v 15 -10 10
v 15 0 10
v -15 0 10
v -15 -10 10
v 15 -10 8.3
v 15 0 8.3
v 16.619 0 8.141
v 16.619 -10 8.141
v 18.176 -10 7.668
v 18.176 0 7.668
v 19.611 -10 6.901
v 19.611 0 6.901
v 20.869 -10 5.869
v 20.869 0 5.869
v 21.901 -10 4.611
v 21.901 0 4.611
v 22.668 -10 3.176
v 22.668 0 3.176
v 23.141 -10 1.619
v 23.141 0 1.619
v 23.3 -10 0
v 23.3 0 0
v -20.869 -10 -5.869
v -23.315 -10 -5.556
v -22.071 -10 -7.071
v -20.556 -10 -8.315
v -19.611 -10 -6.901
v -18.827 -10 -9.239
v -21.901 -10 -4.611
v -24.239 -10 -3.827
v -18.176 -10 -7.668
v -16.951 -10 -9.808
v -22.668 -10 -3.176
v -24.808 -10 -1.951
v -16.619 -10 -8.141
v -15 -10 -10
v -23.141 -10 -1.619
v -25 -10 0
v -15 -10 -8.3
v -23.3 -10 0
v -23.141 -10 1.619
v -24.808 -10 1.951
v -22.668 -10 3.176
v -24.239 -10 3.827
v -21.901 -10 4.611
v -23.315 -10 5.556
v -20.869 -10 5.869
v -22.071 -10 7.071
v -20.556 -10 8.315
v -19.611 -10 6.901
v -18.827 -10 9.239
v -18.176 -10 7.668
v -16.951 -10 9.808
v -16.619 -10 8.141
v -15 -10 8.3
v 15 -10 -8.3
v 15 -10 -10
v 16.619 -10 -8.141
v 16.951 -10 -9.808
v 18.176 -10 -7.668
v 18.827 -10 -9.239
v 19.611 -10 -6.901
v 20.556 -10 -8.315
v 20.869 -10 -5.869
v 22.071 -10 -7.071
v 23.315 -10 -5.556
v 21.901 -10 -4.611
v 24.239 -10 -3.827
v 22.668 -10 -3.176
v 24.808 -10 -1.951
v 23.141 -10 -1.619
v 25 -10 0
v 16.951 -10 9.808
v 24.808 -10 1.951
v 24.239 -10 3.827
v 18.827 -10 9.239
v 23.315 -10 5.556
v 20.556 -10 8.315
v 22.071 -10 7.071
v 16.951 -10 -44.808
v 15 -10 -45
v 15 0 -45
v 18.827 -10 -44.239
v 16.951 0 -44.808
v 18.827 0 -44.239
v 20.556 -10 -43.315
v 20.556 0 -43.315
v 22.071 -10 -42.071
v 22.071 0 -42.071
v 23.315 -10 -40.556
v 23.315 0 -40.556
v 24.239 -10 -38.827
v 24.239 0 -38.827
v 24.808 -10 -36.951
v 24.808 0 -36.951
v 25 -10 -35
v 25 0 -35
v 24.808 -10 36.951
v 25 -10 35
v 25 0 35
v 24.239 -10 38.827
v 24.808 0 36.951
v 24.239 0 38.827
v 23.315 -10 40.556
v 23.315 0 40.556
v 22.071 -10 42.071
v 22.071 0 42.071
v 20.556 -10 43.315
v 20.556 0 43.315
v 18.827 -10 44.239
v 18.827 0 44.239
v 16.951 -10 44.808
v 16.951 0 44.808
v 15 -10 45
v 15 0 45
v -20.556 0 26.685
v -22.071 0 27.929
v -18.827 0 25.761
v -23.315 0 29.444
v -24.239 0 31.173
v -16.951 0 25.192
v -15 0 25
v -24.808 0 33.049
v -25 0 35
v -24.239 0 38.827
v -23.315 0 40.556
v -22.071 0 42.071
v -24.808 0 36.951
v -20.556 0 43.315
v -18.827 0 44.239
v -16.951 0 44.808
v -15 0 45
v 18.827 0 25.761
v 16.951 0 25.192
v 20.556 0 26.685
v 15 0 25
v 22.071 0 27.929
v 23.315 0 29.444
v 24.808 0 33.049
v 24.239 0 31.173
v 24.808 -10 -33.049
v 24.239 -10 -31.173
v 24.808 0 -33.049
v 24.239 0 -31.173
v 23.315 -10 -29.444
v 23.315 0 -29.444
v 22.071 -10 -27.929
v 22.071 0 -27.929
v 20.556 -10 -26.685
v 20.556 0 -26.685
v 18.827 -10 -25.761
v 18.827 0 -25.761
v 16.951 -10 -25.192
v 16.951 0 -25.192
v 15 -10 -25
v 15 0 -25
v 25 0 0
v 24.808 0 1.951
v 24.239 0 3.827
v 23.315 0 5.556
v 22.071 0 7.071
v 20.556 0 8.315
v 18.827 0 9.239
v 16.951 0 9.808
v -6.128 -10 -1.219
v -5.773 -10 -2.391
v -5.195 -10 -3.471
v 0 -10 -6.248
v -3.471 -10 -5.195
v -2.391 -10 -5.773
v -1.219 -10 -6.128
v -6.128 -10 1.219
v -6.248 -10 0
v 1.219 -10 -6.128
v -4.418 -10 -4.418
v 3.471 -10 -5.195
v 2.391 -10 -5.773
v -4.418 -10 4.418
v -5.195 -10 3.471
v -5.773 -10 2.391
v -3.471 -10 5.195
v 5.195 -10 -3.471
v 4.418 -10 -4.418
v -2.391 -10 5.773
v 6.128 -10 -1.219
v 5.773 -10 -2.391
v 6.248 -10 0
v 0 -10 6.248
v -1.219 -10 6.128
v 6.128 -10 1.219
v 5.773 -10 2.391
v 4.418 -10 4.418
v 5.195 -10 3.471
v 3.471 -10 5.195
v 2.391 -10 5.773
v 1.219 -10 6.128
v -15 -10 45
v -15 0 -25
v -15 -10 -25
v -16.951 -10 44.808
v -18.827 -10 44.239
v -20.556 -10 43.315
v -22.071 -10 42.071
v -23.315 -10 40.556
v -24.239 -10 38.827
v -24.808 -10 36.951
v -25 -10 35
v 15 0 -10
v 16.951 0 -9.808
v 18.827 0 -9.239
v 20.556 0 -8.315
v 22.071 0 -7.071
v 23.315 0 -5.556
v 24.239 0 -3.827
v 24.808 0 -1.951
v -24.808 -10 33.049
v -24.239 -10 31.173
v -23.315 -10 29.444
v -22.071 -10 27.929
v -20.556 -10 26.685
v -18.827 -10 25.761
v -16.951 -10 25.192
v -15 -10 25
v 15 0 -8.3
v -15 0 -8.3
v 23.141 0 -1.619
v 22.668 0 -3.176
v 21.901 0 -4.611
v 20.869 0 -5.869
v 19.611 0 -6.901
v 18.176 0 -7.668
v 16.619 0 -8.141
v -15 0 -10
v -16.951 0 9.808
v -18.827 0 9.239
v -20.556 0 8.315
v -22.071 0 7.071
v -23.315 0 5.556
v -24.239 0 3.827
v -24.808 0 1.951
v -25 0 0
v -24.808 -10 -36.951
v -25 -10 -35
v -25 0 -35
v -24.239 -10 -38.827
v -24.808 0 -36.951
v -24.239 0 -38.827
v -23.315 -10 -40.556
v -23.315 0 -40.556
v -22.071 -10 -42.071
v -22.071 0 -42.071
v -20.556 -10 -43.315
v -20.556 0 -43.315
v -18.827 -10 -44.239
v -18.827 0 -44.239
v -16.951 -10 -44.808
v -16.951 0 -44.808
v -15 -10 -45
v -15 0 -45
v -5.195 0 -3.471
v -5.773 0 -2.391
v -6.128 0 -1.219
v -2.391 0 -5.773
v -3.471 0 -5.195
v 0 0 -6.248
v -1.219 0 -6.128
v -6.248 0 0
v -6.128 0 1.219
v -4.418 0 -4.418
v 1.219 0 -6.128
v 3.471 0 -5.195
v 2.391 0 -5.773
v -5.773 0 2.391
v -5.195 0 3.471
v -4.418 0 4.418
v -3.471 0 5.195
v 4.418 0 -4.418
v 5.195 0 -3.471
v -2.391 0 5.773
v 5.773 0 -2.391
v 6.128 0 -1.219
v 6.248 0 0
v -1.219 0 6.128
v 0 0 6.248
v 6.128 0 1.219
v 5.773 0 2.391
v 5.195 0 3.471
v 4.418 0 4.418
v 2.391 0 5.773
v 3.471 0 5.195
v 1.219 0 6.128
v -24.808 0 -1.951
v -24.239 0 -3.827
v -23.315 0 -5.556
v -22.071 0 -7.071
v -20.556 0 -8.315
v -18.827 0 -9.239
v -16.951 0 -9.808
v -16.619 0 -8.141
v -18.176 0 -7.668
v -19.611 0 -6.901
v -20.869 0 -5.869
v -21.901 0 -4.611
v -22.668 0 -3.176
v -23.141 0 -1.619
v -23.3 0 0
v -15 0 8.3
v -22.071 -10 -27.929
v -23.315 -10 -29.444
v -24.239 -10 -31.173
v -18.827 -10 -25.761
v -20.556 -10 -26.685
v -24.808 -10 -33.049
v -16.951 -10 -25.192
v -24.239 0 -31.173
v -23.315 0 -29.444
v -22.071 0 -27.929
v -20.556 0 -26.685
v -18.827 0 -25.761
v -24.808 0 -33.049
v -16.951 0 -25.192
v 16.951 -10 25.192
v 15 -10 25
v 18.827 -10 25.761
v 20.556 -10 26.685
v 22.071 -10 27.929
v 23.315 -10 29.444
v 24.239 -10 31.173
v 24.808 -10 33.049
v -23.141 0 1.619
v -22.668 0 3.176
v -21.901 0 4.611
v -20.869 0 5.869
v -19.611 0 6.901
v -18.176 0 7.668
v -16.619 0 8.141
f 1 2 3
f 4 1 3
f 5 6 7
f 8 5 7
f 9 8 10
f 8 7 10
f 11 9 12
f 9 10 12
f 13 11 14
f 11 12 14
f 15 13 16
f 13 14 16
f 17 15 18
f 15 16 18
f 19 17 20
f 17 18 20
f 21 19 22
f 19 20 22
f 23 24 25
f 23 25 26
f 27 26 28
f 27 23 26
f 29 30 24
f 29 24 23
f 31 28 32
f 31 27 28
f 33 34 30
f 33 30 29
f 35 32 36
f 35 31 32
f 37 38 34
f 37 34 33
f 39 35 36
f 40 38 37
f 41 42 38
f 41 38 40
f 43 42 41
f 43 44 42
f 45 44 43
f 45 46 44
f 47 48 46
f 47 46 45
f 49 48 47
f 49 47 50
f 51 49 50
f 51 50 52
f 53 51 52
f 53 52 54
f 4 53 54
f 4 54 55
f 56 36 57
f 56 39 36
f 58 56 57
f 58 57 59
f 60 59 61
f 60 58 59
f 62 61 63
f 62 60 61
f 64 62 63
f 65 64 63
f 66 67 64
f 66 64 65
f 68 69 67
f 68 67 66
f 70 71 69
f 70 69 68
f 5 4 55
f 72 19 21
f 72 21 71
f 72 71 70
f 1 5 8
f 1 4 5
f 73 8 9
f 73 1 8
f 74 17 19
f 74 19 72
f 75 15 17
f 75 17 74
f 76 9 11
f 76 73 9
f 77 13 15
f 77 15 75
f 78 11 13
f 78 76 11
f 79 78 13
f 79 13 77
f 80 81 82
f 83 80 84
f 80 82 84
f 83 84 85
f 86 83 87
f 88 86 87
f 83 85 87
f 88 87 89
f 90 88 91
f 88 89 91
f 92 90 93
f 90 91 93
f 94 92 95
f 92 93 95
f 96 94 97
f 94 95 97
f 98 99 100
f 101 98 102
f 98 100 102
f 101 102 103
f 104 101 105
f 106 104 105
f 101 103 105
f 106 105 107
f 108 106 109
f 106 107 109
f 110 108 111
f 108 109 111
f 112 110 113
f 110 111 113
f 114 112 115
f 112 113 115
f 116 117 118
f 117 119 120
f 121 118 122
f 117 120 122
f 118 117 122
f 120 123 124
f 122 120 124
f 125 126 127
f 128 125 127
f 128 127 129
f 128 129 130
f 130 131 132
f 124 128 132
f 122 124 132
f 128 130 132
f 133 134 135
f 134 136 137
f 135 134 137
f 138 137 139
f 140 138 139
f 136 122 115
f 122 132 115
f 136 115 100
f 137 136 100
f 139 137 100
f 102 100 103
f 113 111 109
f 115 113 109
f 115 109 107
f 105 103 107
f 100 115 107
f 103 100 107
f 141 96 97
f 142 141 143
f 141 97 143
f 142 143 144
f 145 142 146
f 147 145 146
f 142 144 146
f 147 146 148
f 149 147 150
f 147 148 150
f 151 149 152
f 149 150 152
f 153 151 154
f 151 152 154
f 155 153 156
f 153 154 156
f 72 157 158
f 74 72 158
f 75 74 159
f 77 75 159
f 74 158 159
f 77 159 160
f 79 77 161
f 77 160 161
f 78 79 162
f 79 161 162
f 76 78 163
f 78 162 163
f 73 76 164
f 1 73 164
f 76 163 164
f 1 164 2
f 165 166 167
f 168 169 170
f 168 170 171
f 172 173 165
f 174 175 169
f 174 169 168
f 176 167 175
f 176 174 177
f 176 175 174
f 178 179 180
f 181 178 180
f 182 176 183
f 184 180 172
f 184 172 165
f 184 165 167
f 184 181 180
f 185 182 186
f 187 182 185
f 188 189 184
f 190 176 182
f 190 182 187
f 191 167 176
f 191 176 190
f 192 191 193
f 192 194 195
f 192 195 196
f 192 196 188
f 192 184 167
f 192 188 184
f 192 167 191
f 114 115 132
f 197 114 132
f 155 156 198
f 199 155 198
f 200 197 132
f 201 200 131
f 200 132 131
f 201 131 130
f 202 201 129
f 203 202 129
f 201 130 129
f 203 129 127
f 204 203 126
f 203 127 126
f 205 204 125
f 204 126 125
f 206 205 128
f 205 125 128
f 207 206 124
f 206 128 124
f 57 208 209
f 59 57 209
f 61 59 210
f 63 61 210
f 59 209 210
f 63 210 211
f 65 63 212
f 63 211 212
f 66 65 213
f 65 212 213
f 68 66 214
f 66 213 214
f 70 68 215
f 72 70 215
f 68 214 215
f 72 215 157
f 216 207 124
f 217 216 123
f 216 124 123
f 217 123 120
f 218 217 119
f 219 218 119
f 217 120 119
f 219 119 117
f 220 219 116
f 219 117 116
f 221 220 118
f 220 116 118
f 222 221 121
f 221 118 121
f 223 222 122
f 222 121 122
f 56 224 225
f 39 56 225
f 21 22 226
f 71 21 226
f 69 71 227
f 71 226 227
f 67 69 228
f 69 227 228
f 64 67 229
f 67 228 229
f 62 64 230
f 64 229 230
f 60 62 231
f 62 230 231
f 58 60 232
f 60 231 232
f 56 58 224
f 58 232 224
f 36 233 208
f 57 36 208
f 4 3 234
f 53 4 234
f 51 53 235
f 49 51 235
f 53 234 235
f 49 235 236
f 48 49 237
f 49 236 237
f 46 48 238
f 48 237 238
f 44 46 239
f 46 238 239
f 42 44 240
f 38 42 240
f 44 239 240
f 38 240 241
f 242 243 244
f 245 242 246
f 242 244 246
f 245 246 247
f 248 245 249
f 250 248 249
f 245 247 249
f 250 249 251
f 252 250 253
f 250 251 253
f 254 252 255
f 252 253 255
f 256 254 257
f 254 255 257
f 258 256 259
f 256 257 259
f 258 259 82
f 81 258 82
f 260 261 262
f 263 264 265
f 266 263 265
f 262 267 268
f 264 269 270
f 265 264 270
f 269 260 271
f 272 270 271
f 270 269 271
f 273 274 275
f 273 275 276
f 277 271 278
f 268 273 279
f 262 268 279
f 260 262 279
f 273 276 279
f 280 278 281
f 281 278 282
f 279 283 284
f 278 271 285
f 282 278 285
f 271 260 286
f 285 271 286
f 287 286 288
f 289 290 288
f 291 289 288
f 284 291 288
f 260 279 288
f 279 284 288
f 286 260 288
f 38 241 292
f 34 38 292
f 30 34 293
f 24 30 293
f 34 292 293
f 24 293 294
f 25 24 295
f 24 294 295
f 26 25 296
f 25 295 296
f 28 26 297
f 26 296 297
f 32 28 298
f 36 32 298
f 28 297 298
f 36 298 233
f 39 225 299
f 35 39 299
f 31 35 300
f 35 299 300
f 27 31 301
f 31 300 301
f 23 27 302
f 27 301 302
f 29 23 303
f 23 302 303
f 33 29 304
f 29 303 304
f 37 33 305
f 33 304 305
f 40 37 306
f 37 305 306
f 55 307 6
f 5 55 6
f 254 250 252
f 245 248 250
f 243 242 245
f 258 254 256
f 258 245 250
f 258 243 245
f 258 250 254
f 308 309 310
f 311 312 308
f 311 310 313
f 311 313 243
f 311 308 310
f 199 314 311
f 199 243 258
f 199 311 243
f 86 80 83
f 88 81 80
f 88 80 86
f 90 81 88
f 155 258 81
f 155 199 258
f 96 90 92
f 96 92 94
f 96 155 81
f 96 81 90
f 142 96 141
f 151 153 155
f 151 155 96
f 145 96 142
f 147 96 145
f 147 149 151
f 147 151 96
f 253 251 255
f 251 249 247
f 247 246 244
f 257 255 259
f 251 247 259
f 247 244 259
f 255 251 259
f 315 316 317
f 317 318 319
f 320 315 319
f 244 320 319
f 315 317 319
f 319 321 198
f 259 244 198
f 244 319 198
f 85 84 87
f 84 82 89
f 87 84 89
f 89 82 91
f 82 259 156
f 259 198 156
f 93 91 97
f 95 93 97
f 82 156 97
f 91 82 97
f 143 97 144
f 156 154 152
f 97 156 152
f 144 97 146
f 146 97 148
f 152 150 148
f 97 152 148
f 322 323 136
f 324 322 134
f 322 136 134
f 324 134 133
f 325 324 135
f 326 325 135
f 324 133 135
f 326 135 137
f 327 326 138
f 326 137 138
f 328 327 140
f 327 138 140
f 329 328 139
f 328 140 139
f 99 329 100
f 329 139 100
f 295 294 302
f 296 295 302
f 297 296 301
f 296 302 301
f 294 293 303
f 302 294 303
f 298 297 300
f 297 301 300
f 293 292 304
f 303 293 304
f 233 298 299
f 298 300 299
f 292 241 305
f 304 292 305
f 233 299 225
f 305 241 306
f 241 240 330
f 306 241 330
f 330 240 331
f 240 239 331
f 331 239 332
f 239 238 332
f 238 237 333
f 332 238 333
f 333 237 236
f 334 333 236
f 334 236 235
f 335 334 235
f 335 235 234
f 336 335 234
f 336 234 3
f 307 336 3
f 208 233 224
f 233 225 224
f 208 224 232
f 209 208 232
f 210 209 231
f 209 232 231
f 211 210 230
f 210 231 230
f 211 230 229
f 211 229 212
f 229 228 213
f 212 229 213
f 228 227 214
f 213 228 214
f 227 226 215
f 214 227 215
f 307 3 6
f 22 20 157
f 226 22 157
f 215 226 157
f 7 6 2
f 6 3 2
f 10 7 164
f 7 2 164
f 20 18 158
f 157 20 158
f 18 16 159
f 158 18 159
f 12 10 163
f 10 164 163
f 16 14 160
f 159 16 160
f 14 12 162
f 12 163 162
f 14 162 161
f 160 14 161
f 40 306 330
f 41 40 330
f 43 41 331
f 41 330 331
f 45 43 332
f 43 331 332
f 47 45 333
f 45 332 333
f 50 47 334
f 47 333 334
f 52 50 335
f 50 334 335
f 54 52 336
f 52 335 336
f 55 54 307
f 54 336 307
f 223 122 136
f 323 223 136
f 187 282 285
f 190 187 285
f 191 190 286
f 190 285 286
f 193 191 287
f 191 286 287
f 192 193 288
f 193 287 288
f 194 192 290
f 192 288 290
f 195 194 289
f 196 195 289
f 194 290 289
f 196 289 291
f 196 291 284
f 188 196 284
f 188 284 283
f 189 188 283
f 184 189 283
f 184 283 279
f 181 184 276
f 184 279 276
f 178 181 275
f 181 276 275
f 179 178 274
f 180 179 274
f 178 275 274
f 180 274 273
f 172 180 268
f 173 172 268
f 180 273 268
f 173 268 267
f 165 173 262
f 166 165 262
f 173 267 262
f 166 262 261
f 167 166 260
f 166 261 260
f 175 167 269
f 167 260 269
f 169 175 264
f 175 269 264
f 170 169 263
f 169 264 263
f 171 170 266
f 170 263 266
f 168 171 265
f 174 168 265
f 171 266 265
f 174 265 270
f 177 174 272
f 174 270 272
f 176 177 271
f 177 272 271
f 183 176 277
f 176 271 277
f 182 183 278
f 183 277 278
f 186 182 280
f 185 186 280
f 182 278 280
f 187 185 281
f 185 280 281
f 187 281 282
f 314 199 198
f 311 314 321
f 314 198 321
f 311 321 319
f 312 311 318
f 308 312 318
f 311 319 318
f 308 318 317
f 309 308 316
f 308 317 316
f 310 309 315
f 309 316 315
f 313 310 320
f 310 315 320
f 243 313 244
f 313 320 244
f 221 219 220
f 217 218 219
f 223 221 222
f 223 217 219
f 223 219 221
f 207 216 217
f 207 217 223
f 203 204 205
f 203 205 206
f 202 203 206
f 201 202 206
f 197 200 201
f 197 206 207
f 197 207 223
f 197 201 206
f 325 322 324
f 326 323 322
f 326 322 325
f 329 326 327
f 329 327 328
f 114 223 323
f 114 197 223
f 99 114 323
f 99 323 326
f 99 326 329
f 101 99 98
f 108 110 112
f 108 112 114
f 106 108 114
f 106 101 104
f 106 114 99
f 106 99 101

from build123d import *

# Parameters (mm, degrees)
F1_DEPTH = 10
F0_R     = 6.2483887498


with BuildPart() as f1:
    # F0 (on Front) → F1 (new body)
    with BuildSketch(Plane.XZ):
        with BuildLine():
            Line((-15, 25), (15, 25))
            ThreePointArc((15, 25), (22.0710678119, 27.9289321881), (25, 35))
            ThreePointArc((25, 35), (22.0710678119, 42.0710678119), (15, 45))
            Line((15, 45), (-15, 45))
            ThreePointArc((-15, 45), (-22.0710678119, 42.0710678119), (-25, 35))
            ThreePointArc((-25, 35), (-22.0710678119, 27.9289321881), (-15, 25))
        make_face()
    extrude(amount=F1_DEPTH)


with BuildPart() as f1b:
    # F0 (on Front) → F1, piece 2 (new body)
    with BuildSketch(Plane.XZ):
        Circle(F0_R)
    extrude(amount=F1_DEPTH)


with BuildPart() as f1c:
    # F0 (on Front) → F1, piece 3 (new body)
    with BuildSketch(Plane.XZ):
        with BuildLine():
            ThreePointArc((25, 0), (22.0710678119, 7.0710678119), (15, 10))
            Line((15, 10), (-15, 10))
            ThreePointArc((-15, 10), (-22.0710678119, 7.0710678119), (-25, 0))
            ThreePointArc((-25, 0), (-22.0710678119, -7.0710678119), (-15, -10))
            Line((-15, -10), (10.1771699265, -10))
            Line((10.1771699265, -10), (15, -10))
            ThreePointArc((15, -10), (22.0710678119, -7.0710678119), (25, 0))
        make_face()
        with BuildLine():
            ThreePointArc((15, 8.2999998704), (20.8689861922, 5.8689861922), (23.2999998704, 0))
            ThreePointArc((23.2999998704, 0), (20.8689861922, -5.8689861922), (15, -8.2999998704))
            Line((15, -8.2999998704), (-15, -8.2999998704))
            ThreePointArc((-15, -8.2999998704), (-20.8689861922, -5.8689861922), (-23.2999998704, 0))
            ThreePointArc((-23.2999998704, 0), (-20.8689861922, 5.8689861922), (-15, 8.2999998704))
            Line((-15, 8.2999998704), (15, 8.2999998704))
        make_face(mode=Mode.SUBTRACT)
    extrude(amount=F1_DEPTH)


with BuildPart() as f1d:
    # F0 (on Front) → F1, piece 4 (new body)
    with BuildSketch(Plane.XZ):
        with BuildLine():
            ThreePointArc((15, -45), (22.0710678119, -42.0710678119), (25, -35))
            ThreePointArc((25, -35), (22.0710678119, -27.9289321881), (15, -25))
            Line((15, -25), (-15, -25))
            ThreePointArc((-15, -25), (-22.0710678119, -27.9289321881), (-25, -35))
            ThreePointArc((-25, -35), (-22.0710678119, -42.0710678119), (-15, -45))
            Line((-15, -45), (15, -45))
        make_face()
    extrude(amount=F1_DEPTH)


solid = Compound([f1.part, f1b.part, f1c.part, f1d.part])
